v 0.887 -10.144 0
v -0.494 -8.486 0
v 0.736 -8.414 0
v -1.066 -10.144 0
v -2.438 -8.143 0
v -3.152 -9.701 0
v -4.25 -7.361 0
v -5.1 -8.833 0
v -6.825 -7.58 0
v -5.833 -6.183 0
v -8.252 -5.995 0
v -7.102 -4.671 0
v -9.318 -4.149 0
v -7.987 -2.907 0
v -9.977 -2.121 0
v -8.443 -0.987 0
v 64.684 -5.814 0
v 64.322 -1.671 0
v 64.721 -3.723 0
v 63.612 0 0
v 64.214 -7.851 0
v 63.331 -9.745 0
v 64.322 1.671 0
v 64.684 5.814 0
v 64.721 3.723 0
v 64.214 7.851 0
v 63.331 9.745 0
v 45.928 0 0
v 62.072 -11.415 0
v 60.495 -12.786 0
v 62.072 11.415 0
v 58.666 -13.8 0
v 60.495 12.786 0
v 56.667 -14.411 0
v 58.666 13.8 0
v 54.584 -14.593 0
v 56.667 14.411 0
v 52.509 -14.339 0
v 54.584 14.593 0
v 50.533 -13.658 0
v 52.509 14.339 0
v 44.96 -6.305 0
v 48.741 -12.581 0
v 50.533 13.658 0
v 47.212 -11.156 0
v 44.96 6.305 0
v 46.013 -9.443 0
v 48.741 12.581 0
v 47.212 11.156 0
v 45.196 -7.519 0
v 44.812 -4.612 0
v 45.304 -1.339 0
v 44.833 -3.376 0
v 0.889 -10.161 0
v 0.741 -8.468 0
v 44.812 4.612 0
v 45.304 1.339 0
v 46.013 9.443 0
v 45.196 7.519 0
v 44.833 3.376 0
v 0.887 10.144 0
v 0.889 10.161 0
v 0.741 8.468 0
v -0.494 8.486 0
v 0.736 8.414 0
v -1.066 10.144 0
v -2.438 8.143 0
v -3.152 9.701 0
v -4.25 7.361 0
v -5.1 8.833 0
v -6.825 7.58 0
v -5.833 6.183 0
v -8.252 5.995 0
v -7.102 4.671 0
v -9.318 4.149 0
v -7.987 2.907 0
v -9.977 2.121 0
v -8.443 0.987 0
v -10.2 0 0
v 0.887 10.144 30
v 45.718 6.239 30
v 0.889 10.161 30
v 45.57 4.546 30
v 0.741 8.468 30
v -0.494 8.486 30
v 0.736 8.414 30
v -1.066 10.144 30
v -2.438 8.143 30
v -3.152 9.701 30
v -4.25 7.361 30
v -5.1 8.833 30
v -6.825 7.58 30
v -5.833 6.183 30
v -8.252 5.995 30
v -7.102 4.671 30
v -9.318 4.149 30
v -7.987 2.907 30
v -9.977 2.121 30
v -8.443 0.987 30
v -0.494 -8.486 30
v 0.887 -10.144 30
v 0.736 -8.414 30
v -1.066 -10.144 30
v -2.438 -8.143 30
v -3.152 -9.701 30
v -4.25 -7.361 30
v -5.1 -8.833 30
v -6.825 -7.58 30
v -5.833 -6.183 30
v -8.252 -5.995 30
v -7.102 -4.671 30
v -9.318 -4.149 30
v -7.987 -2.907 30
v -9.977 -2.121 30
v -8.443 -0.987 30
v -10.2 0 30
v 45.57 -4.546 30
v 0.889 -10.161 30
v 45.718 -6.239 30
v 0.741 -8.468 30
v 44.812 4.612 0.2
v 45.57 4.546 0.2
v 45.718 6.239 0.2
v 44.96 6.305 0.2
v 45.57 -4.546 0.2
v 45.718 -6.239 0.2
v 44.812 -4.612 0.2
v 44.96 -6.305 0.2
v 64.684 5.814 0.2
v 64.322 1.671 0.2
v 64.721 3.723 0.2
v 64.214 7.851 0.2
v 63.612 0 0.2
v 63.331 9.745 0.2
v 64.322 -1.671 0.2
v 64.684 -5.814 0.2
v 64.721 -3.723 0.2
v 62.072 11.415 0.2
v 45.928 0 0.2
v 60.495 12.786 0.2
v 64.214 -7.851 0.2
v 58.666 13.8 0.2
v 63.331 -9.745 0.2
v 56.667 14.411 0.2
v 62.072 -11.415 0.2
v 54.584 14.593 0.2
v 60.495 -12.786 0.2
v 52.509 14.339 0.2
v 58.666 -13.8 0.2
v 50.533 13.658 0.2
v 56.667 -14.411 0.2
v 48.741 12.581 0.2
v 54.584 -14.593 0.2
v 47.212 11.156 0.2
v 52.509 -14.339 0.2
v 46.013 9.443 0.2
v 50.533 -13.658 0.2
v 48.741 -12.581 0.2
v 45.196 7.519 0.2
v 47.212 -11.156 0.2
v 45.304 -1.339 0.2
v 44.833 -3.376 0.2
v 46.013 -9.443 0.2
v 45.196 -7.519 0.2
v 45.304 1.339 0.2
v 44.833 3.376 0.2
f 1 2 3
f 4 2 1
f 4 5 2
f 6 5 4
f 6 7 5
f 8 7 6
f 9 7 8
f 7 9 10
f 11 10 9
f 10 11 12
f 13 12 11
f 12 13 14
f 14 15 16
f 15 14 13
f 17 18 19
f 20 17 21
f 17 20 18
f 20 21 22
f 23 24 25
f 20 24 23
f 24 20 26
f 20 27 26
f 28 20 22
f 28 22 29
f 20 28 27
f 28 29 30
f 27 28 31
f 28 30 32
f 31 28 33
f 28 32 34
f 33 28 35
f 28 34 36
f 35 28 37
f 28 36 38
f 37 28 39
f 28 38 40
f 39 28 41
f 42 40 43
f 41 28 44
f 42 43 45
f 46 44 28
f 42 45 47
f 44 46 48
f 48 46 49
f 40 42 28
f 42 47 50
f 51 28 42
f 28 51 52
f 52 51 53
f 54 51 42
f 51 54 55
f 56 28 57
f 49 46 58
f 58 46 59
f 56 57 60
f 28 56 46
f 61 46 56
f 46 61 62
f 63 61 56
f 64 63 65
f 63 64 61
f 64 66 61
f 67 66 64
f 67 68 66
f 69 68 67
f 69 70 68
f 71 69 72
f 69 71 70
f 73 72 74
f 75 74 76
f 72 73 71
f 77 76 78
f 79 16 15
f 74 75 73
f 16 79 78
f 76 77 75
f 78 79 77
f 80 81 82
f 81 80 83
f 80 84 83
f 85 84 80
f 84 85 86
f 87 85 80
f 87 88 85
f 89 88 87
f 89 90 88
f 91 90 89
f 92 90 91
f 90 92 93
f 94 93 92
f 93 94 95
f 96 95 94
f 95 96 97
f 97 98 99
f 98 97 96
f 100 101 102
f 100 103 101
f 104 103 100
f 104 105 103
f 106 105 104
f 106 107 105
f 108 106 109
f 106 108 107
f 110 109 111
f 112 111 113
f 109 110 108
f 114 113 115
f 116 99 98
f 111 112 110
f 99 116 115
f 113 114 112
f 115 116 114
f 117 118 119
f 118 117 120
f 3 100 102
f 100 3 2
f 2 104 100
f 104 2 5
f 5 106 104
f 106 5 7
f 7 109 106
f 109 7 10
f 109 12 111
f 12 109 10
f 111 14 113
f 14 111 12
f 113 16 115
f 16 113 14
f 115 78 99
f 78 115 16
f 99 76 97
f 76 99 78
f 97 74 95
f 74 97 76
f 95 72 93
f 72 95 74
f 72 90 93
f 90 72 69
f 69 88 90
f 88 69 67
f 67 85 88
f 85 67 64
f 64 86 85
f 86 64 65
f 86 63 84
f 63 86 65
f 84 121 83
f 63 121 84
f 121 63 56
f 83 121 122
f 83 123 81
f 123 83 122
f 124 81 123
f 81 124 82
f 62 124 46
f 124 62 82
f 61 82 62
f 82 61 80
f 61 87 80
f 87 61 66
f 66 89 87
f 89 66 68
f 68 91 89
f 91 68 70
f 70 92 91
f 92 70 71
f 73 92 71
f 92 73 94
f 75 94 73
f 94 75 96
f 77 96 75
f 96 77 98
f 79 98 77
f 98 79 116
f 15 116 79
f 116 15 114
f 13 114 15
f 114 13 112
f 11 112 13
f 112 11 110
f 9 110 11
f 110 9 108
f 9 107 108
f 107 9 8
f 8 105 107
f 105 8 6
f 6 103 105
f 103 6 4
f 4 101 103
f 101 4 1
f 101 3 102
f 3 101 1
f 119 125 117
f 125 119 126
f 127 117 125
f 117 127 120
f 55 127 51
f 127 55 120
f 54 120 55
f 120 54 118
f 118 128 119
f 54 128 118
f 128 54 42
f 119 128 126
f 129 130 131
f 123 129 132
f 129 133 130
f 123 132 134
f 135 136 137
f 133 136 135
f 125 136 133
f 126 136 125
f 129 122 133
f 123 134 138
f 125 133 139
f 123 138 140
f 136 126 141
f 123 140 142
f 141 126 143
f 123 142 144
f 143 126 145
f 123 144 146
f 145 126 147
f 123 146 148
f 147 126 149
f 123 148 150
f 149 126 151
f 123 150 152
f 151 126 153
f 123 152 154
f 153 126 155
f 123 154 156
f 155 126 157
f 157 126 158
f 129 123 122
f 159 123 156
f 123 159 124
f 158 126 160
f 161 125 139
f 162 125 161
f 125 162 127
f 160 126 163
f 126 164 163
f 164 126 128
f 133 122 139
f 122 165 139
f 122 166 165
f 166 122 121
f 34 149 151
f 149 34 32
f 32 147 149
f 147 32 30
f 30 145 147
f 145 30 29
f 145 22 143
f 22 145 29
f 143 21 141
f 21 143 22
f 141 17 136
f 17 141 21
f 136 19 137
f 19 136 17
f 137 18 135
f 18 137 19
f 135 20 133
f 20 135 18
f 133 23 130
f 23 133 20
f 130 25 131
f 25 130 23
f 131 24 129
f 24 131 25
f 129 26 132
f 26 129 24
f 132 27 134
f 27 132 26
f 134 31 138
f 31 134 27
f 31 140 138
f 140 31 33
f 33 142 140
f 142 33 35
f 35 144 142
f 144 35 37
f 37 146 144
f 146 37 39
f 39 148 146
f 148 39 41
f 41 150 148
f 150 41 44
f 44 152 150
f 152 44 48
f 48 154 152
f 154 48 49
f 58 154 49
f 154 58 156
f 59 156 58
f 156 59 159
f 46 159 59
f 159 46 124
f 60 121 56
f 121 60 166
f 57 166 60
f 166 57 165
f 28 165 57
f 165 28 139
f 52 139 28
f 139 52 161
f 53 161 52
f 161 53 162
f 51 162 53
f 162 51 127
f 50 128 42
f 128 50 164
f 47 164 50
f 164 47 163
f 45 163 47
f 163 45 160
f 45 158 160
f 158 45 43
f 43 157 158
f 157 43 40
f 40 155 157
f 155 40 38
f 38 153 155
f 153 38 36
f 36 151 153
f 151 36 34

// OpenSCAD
shelf_thickness = 17;
compression = 10; // [0:180]
wall_thickness = 1.7;
height = 30;
length = 45;
mouse_ears = 10;

module _(){}
pi=3.1415;
circumference = shelf_thickness*pi;
wt=wall_thickness;
ir = shelf_thickness/2; //todo

module mirror2(xyz){
    children();
    mirror(xyz) children();
}

linear_extrude(height){
    
    difference(){
        // main ring
        circle(r=ir+wt);
        circle(r=ir);
        
        //cut out C shape
        intersection(){
            sq = ir+wt;
            rotate([0,0,-compression/2])
                translate([0,-sq,0])
                square([sq,2*sq]);
            rotate([0,0,compression/2])
                translate([0,-sq,0])
                square([sq,2*sq]);
        }
    }
    
    // legs
    mirror2([0,1,0])
        rotate([0,0,-compression/2])
        translate([0,ir,0])
        square([length,wt]);
}

if(mouse_ears > 0) color("green")linear_extrude(.2) {
    mirror2([0,1,0])
        rotate([0,0,-compression/2])
        translate([length+mouse_ears -wt/2,ir+wt/2,0])
        circle(r=mouse_ears);
}

//cube();
